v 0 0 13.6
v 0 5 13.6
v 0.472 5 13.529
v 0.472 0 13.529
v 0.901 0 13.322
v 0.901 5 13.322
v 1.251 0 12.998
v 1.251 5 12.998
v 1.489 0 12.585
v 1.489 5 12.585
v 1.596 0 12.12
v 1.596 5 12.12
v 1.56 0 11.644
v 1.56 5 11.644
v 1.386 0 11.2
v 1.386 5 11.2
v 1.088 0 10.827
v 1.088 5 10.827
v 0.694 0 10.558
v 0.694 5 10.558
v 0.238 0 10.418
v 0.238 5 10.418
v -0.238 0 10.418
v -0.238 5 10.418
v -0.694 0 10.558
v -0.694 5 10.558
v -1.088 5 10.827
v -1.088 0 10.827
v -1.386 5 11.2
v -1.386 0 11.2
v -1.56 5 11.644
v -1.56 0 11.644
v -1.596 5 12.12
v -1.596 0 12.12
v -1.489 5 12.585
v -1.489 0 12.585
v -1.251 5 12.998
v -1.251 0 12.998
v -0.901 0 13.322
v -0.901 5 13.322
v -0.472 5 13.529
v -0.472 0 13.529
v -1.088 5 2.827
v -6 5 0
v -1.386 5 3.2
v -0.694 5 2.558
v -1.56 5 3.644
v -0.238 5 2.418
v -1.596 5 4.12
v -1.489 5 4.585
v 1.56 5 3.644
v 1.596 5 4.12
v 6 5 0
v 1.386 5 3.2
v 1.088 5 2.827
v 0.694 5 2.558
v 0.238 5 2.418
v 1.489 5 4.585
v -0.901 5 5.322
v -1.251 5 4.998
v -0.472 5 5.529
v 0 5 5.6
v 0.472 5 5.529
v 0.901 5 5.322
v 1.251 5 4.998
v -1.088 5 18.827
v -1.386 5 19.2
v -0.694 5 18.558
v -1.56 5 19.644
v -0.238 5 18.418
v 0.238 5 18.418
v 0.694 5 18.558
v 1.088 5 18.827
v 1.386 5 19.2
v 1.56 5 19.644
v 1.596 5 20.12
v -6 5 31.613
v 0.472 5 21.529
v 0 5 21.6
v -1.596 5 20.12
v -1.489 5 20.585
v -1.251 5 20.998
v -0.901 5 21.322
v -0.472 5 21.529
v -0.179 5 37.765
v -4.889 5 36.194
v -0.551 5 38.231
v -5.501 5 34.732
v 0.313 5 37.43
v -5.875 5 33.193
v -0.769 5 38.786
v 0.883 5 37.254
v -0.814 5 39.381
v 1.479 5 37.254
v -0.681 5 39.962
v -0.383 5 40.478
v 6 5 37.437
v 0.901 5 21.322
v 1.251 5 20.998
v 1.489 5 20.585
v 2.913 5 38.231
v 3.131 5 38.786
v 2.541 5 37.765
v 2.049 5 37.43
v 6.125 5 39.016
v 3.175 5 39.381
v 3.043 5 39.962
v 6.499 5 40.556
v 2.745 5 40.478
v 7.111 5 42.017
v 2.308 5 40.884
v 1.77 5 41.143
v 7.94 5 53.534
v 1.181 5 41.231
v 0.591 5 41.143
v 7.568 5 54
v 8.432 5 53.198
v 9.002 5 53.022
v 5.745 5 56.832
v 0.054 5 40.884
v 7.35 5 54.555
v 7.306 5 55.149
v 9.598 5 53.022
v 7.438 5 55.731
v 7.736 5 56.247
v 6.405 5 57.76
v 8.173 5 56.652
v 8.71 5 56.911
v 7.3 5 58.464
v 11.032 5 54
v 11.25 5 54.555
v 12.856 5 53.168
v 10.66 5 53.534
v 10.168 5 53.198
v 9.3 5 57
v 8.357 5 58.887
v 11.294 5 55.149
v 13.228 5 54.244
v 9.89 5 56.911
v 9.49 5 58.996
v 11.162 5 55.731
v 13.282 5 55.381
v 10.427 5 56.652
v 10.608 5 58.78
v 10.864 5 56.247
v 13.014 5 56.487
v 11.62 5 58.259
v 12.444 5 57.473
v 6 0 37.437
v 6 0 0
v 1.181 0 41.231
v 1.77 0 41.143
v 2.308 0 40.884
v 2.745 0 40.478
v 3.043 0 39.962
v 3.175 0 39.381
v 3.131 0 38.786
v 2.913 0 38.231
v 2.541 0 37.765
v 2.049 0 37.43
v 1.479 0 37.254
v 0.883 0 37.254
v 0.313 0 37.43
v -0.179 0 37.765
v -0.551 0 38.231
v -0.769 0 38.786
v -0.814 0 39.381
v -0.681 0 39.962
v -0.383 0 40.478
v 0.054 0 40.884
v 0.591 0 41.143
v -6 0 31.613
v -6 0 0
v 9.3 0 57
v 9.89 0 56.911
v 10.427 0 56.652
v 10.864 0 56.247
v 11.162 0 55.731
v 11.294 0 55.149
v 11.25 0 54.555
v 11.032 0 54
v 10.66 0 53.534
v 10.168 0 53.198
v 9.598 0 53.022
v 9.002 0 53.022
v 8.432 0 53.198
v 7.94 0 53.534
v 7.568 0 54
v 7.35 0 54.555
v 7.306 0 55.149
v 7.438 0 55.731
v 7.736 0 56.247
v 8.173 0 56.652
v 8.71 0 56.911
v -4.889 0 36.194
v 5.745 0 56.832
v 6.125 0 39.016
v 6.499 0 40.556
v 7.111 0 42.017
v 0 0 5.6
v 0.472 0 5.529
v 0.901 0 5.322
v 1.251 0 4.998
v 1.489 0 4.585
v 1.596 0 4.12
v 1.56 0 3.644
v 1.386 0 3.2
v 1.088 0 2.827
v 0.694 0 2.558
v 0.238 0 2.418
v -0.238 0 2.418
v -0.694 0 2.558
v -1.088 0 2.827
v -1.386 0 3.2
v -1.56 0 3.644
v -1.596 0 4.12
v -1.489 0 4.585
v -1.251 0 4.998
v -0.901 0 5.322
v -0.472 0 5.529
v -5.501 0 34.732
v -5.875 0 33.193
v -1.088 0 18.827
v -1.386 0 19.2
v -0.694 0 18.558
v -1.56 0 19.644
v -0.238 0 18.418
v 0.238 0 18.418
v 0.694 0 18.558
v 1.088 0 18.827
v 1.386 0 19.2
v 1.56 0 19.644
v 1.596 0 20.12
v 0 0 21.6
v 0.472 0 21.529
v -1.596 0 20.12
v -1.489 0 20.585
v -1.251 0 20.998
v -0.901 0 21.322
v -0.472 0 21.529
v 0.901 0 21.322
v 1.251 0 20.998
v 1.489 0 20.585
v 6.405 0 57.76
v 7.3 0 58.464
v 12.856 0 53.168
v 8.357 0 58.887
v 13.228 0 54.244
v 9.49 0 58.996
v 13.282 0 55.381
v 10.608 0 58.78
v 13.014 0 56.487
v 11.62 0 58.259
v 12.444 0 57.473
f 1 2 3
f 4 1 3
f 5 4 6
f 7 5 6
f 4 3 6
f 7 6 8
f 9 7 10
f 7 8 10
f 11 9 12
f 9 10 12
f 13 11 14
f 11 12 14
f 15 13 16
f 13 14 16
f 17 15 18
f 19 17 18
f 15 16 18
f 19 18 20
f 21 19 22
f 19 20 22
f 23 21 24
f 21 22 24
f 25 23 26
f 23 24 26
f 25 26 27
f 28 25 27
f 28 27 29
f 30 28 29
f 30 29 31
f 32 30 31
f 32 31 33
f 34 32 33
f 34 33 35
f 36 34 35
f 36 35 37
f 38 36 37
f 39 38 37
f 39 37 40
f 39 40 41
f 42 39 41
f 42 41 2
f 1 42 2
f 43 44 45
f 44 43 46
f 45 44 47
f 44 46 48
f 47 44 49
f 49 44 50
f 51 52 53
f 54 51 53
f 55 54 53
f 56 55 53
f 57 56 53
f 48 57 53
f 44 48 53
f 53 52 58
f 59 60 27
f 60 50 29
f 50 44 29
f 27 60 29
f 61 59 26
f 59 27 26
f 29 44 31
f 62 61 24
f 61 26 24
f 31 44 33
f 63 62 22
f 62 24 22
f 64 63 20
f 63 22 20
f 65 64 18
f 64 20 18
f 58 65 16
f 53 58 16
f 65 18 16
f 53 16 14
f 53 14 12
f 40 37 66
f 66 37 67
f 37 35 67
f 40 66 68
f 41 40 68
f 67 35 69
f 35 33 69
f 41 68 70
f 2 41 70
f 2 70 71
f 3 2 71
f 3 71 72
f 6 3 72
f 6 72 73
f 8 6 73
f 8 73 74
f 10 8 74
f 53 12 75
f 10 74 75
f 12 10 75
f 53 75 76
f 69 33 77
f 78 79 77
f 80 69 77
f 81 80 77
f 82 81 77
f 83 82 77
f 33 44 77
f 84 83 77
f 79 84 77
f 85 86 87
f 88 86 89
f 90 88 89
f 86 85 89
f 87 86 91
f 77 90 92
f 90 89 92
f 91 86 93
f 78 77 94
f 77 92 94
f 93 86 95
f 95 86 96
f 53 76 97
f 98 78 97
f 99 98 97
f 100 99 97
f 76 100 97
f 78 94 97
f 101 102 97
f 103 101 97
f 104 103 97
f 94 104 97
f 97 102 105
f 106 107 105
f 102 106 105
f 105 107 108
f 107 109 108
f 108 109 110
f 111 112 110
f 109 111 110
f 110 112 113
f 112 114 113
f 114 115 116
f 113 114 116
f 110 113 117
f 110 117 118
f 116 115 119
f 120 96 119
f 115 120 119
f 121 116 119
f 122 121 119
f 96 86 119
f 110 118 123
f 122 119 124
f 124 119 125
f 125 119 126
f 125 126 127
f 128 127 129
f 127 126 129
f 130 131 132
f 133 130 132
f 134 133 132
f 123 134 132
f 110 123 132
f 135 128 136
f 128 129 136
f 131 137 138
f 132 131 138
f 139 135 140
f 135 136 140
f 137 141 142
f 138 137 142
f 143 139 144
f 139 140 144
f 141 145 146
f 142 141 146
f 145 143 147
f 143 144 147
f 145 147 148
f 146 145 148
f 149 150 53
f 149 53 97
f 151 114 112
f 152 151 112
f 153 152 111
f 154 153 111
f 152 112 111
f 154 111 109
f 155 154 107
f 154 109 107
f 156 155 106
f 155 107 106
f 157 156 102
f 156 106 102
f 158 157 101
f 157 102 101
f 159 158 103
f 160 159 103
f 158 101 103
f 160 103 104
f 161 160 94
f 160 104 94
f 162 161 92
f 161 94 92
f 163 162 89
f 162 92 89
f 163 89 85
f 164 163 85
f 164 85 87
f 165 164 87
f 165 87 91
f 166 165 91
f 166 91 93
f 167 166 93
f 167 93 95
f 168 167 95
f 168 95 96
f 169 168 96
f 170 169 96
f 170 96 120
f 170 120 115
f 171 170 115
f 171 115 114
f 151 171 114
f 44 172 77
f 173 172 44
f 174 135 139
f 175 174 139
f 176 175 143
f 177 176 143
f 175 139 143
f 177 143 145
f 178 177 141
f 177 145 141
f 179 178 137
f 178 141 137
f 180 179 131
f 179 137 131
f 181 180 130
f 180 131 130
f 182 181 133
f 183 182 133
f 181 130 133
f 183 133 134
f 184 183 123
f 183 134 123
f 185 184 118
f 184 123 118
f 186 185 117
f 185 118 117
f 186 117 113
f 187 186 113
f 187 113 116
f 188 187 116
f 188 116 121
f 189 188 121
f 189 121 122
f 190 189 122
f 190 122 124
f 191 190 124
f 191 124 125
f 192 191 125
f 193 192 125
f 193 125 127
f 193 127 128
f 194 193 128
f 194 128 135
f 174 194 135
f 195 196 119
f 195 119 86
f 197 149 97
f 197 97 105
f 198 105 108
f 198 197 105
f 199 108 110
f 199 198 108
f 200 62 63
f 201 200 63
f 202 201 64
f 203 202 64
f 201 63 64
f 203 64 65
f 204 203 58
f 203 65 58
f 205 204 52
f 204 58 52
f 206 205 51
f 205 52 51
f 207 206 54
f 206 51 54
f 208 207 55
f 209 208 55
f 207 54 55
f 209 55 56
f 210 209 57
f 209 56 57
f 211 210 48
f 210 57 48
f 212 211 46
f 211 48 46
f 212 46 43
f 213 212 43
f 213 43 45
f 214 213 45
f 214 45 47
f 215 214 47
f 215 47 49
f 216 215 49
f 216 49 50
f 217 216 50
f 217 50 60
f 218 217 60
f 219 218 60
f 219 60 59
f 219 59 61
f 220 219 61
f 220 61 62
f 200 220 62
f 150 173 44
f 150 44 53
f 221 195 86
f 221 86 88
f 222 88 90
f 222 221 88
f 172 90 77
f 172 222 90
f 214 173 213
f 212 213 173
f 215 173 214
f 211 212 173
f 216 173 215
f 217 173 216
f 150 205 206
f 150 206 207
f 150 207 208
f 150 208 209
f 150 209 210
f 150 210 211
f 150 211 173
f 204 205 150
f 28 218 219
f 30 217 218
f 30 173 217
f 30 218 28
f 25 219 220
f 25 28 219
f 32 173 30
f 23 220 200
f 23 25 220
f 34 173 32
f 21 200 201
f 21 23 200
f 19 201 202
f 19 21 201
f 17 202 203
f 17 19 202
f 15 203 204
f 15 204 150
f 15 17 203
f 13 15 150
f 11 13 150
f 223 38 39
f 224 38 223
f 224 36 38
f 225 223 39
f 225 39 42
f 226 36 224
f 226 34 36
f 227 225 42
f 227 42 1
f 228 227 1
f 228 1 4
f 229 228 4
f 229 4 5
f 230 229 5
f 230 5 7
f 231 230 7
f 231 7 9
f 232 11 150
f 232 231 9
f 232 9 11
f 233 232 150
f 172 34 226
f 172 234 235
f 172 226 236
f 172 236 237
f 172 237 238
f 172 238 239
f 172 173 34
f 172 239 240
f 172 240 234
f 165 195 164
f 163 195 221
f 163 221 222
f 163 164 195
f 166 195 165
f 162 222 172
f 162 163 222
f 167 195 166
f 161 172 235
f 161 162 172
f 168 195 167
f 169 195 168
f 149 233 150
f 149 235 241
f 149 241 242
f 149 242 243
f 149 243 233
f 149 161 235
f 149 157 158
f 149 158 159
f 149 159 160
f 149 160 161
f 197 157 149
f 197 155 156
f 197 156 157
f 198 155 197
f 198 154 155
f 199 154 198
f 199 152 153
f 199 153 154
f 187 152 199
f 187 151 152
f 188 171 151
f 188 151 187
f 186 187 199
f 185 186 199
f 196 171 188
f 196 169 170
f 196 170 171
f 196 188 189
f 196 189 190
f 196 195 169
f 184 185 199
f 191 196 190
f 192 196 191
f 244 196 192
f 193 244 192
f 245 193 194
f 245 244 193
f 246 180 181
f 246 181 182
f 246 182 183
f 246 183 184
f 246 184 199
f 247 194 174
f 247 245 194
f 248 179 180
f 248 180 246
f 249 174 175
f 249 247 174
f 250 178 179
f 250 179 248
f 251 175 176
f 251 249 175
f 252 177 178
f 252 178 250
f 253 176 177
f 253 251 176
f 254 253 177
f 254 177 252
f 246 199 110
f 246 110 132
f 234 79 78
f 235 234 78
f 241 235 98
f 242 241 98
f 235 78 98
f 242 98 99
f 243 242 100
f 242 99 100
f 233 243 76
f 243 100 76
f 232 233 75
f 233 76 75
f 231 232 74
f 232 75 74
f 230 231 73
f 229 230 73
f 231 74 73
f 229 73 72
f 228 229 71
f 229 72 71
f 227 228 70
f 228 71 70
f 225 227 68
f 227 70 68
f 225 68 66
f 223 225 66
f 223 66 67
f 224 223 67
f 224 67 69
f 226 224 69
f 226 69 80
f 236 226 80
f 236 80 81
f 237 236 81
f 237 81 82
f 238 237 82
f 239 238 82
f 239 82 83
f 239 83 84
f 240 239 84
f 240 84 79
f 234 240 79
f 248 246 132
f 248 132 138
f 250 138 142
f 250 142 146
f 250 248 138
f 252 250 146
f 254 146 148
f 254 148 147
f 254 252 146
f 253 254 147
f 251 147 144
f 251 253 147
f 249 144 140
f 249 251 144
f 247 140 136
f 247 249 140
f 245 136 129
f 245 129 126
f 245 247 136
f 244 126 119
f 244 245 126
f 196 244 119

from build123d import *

# Parameters (mm, degrees)
EXTRUDE_1_DEPTH         = 5
HOLE_WIZARD_A_0_234_3_D = 3.1999936
PATTERN_LINEAR_1_COUNT  = 3
PATTERN_LINEAR_1_PITCH  = 8
HOLE_WIZARD_A_0_234_4_D = 4


with BuildPart() as part:
    # Эскиз1 → Бобышка-Вытянуть1 (new body)
    with BuildSketch(Plane.XZ):
        with BuildLine():
            Line((-6, 31.613261479), (-6, 0))
            Line((-6, 0), (6, 0))
            Line((6, 0), (6, 37.436574312))
            ThreePointArc((6, 37.436574312), (6.281622528, 39.793084297), (7.110627862, 42.016865021))
            Line((7.110627862, 42.016865021), (12.856242572, 53.167883716))
            ThreePointArc((12.856242572, 53.167883716), (11.13261, 58.555748855), (5.744744861, 56.832116284))
            Line((5.744744861, 56.832116284), (-4.889372139, 36.193552189))
            ThreePointArc((-4.889372139, 36.193552189), (-5.718377472, 33.969771464), (-6, 31.613261479))
        make_face()
    extrude(amount=-EXTRUDE_1_DEPTH)

    # Диаметр отверстия A (0.234)3 (through all)
    with Locations(Plane(origin=(0, 0, 4), x_dir=(0, 0, -1), z_dir=(0, -1, 0))):
        with Locations((0, 0)):
            hole_wizard_a_0_234_3 = Hole(HOLE_WIZARD_A_0_234_3_D / 2)

    # Линейный массив1: Диаметр отверстия A (0.234)3 ×3
    with Locations(*[(0, 0, i * PATTERN_LINEAR_1_PITCH) for i in range(1, PATTERN_LINEAR_1_COUNT)]):
        add(hole_wizard_a_0_234_3, mode=Mode.SUBTRACT)

    # Диаметр отверстия A (0.234)4 (through all)
    with Locations(Plane(origin=(9.3, 0, 55), x_dir=(0, 0, -1), z_dir=(0, -1, 0))):
        with Locations((0, 0), (15.76854256, -8.11912081)):
            Hole(HOLE_WIZARD_A_0_234_4_D / 2)


solid = part.part
